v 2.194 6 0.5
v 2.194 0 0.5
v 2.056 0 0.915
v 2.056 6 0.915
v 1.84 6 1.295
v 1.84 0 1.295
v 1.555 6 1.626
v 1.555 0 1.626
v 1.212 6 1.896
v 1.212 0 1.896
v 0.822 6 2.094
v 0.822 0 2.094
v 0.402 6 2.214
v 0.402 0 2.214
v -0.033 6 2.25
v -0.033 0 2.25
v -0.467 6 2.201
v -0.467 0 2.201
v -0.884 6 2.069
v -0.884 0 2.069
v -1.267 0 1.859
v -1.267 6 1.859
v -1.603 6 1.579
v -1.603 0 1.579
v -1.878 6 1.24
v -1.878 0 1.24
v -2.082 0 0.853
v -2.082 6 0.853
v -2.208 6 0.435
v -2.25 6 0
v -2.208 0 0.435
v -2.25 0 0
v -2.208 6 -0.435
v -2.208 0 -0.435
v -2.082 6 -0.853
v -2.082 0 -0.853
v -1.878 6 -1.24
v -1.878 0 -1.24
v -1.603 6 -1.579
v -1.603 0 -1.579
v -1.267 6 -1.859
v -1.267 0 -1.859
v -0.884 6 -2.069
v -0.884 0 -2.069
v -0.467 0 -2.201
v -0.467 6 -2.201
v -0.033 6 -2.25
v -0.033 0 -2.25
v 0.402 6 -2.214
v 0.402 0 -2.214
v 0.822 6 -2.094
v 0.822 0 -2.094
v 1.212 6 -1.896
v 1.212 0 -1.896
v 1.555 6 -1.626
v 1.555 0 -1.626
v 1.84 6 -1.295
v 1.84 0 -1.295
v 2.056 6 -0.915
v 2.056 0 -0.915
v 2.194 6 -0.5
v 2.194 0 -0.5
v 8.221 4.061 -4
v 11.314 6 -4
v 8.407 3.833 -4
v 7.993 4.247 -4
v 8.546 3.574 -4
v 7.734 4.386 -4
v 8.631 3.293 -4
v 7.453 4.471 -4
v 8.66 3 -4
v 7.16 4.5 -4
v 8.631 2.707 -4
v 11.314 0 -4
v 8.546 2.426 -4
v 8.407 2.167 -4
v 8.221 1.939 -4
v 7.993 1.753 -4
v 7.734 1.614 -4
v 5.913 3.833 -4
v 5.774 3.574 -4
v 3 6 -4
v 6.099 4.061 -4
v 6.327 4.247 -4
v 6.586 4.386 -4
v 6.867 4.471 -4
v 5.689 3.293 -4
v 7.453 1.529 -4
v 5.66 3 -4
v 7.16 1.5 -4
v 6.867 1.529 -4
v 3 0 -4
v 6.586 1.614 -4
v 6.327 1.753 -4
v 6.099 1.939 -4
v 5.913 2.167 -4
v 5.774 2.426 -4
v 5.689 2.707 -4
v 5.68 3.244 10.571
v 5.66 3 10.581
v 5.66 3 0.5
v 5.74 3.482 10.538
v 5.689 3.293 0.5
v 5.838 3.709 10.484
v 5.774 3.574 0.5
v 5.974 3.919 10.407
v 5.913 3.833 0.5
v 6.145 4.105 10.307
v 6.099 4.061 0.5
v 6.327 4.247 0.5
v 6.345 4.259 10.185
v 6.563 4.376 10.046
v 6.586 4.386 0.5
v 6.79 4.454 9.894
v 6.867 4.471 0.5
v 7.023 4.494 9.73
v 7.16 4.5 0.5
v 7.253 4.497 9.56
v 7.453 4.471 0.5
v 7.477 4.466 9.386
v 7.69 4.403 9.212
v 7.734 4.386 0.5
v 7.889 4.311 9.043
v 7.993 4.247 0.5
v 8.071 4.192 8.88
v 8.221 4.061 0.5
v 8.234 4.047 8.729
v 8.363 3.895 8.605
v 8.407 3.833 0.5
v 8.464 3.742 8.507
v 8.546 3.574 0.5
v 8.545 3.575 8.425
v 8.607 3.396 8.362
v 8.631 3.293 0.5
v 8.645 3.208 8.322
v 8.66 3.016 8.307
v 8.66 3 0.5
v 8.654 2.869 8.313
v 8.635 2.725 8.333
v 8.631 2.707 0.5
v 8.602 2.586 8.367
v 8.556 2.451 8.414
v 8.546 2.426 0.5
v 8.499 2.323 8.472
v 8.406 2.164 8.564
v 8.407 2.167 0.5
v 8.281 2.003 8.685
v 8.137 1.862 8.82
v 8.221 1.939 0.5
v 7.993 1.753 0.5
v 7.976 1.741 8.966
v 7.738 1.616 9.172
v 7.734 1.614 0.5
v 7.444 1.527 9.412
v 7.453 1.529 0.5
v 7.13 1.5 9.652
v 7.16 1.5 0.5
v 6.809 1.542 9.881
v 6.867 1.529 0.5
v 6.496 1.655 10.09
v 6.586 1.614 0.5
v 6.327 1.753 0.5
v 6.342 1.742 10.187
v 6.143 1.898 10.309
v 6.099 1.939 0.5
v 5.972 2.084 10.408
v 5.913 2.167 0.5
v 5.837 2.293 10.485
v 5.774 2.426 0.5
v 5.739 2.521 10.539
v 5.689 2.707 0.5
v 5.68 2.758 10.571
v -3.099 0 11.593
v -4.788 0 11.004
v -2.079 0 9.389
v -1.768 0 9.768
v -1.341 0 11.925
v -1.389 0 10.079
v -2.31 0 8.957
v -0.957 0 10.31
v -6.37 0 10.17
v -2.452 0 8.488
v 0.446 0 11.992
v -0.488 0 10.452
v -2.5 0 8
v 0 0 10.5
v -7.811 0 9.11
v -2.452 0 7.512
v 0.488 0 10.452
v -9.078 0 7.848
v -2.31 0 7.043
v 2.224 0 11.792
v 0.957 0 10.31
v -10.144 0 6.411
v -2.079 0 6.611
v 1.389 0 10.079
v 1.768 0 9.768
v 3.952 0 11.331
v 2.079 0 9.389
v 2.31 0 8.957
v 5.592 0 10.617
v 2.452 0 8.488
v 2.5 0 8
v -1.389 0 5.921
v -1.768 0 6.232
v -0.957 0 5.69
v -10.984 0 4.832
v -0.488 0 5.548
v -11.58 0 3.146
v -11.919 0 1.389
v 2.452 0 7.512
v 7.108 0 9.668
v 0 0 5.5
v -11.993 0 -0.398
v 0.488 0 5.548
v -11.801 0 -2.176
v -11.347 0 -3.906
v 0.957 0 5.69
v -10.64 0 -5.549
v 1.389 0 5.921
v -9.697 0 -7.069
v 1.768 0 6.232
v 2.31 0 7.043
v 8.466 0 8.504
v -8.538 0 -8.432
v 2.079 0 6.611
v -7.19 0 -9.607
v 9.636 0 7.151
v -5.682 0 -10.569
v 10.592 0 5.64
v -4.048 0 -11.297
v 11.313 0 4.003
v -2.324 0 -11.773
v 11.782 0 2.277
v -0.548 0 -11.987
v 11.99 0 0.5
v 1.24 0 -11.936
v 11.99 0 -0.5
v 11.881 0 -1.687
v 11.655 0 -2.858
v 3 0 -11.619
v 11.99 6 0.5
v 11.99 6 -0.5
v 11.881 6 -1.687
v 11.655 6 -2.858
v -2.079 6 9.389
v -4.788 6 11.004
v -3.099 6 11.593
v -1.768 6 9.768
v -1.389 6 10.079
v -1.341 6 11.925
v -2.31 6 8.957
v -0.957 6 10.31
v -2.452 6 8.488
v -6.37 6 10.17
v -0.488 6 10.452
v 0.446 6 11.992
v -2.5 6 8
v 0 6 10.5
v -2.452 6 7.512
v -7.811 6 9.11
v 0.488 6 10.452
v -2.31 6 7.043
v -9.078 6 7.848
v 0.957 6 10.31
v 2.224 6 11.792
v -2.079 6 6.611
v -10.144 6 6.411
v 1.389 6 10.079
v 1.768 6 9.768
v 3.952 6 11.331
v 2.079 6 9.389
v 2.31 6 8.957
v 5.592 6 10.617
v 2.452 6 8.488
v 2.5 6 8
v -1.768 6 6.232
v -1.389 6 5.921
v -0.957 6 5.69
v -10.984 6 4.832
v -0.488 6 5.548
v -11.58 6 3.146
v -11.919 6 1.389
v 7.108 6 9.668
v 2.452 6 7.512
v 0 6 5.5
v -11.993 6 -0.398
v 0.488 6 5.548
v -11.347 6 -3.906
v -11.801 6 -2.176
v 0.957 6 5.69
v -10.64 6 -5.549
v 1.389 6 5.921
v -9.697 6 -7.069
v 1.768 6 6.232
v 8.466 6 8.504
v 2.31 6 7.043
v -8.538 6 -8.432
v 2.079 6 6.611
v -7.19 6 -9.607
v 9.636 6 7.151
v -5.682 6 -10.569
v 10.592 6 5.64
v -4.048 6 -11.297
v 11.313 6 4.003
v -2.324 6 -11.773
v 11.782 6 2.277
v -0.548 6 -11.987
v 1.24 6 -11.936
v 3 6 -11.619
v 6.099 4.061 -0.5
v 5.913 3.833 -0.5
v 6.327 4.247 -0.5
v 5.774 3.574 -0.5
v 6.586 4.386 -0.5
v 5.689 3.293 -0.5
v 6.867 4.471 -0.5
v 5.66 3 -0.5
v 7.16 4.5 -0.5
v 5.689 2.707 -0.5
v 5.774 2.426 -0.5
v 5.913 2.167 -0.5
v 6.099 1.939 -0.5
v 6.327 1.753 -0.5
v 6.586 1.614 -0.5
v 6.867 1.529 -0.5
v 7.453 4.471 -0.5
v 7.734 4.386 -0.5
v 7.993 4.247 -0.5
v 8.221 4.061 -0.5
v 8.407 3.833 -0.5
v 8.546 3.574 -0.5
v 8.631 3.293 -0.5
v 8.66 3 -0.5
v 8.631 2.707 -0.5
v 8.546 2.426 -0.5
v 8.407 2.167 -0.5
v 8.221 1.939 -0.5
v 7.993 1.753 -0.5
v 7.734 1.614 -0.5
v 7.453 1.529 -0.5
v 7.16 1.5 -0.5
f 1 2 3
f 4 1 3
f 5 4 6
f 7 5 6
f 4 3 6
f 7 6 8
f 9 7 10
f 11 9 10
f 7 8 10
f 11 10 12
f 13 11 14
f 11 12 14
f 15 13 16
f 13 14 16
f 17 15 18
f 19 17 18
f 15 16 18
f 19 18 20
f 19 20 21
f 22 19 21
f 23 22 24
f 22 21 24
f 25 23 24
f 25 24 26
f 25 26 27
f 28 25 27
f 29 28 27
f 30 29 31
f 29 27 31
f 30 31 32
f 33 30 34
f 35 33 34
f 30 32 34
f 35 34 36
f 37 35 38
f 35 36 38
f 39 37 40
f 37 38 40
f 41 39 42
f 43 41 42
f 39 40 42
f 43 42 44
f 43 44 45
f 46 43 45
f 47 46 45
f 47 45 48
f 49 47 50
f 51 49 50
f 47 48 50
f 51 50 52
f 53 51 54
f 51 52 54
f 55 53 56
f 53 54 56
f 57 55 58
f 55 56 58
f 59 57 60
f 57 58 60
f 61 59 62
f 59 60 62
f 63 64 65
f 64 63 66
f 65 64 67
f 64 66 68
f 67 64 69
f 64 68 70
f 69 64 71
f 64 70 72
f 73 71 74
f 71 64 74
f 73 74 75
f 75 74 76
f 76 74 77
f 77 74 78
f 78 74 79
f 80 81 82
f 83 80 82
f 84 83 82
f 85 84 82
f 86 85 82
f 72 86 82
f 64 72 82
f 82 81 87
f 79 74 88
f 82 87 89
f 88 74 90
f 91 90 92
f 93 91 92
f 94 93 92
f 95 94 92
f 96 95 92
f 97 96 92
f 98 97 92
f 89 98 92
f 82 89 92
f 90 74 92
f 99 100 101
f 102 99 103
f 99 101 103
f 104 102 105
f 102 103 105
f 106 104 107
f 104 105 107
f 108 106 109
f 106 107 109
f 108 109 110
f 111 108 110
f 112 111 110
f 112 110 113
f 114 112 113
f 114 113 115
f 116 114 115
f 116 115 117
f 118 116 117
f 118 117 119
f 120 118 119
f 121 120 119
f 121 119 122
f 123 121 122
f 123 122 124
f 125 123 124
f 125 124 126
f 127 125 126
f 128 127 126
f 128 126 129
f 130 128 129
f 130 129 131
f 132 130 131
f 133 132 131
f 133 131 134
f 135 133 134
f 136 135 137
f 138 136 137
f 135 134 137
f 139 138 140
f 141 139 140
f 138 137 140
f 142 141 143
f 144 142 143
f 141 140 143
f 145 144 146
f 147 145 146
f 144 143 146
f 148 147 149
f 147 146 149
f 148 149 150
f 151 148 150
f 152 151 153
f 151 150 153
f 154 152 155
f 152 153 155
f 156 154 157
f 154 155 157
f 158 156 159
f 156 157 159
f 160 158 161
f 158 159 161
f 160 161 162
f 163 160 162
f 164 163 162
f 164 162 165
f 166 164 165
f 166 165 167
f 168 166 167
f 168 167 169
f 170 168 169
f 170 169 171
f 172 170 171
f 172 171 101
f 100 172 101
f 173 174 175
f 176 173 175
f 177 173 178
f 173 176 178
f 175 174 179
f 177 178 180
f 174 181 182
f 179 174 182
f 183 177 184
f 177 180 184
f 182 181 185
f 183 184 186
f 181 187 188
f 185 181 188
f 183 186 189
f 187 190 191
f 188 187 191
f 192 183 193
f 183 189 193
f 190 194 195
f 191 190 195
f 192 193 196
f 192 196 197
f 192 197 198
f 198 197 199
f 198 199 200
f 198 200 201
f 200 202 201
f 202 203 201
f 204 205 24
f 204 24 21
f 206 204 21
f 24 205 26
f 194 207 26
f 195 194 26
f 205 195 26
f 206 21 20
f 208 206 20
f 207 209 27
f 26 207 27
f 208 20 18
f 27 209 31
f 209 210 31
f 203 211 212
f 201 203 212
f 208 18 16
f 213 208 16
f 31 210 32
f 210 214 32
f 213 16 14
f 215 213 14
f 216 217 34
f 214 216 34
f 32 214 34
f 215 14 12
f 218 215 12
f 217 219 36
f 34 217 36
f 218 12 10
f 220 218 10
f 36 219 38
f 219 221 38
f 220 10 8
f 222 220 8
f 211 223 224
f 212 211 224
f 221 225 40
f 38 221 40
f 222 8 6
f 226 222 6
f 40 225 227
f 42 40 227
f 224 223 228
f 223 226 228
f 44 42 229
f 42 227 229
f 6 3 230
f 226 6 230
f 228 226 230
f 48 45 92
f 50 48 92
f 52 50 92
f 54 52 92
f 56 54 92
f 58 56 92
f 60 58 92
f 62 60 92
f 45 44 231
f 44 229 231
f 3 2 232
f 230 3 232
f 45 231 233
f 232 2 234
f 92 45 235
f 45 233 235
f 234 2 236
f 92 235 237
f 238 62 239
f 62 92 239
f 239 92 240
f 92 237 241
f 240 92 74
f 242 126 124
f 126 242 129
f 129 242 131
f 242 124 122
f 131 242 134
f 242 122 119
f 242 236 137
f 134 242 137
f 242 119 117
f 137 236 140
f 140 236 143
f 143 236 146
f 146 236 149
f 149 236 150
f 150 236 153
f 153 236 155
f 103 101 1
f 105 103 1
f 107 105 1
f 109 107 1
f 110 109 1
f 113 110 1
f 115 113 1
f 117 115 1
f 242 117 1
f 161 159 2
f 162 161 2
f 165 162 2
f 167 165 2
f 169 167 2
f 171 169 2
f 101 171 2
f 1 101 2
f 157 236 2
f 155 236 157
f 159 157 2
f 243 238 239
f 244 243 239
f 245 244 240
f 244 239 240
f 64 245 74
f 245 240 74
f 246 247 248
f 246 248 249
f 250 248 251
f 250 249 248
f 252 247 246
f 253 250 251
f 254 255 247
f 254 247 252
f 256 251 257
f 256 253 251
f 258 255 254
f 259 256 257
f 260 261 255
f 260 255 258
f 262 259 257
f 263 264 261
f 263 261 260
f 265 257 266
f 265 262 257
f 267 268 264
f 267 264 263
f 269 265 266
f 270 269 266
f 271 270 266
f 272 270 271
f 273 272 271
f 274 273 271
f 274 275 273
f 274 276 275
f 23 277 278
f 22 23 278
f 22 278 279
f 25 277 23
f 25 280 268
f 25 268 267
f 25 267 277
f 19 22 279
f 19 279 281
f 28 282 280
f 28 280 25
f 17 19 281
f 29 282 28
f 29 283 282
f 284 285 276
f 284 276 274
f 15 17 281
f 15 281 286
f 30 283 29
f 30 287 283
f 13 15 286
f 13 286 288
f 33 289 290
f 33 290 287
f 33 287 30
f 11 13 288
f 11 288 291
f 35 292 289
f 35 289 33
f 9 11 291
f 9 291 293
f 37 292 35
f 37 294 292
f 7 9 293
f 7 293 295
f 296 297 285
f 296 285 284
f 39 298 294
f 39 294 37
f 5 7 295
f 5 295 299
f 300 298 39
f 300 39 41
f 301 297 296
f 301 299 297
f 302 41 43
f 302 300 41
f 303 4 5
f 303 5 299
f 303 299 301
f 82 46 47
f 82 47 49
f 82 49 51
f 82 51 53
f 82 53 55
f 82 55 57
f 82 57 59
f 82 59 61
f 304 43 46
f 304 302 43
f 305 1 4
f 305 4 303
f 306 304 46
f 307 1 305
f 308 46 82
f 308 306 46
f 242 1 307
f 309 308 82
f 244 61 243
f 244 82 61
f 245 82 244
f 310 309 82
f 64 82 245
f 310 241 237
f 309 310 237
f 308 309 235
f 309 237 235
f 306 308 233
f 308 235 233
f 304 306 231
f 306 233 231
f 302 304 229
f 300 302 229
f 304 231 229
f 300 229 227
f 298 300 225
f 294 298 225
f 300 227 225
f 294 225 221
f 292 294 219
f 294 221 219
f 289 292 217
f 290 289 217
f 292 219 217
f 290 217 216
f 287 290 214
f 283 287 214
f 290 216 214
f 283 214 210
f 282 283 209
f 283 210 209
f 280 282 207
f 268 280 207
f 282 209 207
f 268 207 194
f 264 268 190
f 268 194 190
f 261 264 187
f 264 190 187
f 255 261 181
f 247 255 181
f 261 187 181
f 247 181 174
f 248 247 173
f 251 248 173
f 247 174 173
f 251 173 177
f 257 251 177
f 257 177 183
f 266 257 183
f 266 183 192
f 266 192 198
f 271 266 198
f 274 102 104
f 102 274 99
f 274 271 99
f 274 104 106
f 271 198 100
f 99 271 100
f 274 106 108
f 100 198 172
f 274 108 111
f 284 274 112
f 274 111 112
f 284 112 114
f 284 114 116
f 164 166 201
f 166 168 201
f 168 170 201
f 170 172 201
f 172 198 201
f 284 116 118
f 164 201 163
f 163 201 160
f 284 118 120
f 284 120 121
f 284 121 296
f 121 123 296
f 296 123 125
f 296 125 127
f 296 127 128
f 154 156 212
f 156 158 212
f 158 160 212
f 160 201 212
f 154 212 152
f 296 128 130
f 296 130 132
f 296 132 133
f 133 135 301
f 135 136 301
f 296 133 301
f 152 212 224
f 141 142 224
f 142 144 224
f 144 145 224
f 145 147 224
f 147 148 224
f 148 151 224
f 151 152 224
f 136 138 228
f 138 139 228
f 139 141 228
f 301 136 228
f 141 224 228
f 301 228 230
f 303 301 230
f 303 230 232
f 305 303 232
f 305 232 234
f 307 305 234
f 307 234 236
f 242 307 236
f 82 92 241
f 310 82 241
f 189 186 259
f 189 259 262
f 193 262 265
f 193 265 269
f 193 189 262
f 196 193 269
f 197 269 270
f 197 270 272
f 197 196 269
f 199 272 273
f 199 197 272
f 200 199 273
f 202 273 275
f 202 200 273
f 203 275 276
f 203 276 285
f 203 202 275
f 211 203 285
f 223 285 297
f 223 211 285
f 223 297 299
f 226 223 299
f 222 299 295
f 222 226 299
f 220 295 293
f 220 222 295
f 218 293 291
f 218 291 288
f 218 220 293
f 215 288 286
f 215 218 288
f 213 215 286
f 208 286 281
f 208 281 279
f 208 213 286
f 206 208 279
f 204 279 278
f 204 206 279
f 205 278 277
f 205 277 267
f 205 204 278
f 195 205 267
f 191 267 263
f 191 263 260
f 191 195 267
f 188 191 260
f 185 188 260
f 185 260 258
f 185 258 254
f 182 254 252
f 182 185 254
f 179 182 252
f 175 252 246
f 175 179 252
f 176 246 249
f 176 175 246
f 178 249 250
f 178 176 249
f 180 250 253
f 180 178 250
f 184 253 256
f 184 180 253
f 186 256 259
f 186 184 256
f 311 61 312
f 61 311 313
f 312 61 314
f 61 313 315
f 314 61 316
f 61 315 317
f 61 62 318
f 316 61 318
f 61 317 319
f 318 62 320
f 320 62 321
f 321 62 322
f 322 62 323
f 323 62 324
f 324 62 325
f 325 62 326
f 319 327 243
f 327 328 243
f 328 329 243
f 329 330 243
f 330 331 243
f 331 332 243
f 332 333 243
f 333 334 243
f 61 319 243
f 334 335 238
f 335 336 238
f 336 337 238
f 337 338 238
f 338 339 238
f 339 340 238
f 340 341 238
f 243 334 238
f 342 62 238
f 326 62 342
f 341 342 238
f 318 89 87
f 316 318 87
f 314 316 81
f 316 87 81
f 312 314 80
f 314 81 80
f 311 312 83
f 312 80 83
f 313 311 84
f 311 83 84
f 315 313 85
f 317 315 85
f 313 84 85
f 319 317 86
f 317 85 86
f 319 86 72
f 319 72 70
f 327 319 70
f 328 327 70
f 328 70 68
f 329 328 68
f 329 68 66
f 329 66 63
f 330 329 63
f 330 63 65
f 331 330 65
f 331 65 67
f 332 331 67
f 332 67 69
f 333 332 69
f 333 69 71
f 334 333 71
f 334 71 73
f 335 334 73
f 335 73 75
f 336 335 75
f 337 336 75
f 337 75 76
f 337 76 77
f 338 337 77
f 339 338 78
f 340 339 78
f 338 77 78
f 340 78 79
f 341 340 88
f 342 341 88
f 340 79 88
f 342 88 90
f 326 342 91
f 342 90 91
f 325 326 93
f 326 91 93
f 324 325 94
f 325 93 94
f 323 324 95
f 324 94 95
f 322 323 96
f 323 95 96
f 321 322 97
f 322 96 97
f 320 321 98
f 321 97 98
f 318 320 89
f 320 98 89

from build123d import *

# Parameters (mm, degrees)
SKETCH1_R           = 2.5
BOSS_EXTRUDE1_DEPTH = 6
SKETCH3_R           = 1.5
CUT_EXTRUDE2_DEPTH  = 16


with BuildPart() as part:
    # Sketch1 → Boss-Extrude1 (new body)
    with BuildSketch(Plane(origin=(0, 0, 0), x_dir=(1, 0, 0), z_dir=(0, 1, 0))):
        with BuildLine():
            Line((2.193741097, 0.5), (11.989578808, 0.5))
            ThreePointArc((11.989578808, 0.5), (11.782329983, 2.275236289), (11.313708499, 4))
            Line((11.313708499, 4), (3, 4))
            Line((3, 4), (3, 11.618950039))
            ThreePointArc((3, 11.618950039), (-9.637899446, -7.149188365), (11.989578808, -0.5))
            Line((11.989578808, -0.5), (2.193741097, -0.5))
            ThreePointArc((2.193741097, -0.5), (-2.25, 0), (2.193741097, 0.5))
        make_face()
        with Locations(Location((0, -8, 0), (0, 0, 270))):
            Circle(SKETCH1_R, mode=Mode.SUBTRACT)
    extrude(amount=BOSS_EXTRUDE1_DEPTH)

    # Sketch3 → Cut-Extrude2 (cut)
    with BuildSketch(Plane(origin=(0, 0, -4), x_dir=(-1, 0, 0), z_dir=(0, 0, -1))):
        with Locations((-7.16, 3)):
            Circle(SKETCH3_R)
    extrude(amount=-CUT_EXTRUDE2_DEPTH, mode=Mode.SUBTRACT)


solid = part.part
